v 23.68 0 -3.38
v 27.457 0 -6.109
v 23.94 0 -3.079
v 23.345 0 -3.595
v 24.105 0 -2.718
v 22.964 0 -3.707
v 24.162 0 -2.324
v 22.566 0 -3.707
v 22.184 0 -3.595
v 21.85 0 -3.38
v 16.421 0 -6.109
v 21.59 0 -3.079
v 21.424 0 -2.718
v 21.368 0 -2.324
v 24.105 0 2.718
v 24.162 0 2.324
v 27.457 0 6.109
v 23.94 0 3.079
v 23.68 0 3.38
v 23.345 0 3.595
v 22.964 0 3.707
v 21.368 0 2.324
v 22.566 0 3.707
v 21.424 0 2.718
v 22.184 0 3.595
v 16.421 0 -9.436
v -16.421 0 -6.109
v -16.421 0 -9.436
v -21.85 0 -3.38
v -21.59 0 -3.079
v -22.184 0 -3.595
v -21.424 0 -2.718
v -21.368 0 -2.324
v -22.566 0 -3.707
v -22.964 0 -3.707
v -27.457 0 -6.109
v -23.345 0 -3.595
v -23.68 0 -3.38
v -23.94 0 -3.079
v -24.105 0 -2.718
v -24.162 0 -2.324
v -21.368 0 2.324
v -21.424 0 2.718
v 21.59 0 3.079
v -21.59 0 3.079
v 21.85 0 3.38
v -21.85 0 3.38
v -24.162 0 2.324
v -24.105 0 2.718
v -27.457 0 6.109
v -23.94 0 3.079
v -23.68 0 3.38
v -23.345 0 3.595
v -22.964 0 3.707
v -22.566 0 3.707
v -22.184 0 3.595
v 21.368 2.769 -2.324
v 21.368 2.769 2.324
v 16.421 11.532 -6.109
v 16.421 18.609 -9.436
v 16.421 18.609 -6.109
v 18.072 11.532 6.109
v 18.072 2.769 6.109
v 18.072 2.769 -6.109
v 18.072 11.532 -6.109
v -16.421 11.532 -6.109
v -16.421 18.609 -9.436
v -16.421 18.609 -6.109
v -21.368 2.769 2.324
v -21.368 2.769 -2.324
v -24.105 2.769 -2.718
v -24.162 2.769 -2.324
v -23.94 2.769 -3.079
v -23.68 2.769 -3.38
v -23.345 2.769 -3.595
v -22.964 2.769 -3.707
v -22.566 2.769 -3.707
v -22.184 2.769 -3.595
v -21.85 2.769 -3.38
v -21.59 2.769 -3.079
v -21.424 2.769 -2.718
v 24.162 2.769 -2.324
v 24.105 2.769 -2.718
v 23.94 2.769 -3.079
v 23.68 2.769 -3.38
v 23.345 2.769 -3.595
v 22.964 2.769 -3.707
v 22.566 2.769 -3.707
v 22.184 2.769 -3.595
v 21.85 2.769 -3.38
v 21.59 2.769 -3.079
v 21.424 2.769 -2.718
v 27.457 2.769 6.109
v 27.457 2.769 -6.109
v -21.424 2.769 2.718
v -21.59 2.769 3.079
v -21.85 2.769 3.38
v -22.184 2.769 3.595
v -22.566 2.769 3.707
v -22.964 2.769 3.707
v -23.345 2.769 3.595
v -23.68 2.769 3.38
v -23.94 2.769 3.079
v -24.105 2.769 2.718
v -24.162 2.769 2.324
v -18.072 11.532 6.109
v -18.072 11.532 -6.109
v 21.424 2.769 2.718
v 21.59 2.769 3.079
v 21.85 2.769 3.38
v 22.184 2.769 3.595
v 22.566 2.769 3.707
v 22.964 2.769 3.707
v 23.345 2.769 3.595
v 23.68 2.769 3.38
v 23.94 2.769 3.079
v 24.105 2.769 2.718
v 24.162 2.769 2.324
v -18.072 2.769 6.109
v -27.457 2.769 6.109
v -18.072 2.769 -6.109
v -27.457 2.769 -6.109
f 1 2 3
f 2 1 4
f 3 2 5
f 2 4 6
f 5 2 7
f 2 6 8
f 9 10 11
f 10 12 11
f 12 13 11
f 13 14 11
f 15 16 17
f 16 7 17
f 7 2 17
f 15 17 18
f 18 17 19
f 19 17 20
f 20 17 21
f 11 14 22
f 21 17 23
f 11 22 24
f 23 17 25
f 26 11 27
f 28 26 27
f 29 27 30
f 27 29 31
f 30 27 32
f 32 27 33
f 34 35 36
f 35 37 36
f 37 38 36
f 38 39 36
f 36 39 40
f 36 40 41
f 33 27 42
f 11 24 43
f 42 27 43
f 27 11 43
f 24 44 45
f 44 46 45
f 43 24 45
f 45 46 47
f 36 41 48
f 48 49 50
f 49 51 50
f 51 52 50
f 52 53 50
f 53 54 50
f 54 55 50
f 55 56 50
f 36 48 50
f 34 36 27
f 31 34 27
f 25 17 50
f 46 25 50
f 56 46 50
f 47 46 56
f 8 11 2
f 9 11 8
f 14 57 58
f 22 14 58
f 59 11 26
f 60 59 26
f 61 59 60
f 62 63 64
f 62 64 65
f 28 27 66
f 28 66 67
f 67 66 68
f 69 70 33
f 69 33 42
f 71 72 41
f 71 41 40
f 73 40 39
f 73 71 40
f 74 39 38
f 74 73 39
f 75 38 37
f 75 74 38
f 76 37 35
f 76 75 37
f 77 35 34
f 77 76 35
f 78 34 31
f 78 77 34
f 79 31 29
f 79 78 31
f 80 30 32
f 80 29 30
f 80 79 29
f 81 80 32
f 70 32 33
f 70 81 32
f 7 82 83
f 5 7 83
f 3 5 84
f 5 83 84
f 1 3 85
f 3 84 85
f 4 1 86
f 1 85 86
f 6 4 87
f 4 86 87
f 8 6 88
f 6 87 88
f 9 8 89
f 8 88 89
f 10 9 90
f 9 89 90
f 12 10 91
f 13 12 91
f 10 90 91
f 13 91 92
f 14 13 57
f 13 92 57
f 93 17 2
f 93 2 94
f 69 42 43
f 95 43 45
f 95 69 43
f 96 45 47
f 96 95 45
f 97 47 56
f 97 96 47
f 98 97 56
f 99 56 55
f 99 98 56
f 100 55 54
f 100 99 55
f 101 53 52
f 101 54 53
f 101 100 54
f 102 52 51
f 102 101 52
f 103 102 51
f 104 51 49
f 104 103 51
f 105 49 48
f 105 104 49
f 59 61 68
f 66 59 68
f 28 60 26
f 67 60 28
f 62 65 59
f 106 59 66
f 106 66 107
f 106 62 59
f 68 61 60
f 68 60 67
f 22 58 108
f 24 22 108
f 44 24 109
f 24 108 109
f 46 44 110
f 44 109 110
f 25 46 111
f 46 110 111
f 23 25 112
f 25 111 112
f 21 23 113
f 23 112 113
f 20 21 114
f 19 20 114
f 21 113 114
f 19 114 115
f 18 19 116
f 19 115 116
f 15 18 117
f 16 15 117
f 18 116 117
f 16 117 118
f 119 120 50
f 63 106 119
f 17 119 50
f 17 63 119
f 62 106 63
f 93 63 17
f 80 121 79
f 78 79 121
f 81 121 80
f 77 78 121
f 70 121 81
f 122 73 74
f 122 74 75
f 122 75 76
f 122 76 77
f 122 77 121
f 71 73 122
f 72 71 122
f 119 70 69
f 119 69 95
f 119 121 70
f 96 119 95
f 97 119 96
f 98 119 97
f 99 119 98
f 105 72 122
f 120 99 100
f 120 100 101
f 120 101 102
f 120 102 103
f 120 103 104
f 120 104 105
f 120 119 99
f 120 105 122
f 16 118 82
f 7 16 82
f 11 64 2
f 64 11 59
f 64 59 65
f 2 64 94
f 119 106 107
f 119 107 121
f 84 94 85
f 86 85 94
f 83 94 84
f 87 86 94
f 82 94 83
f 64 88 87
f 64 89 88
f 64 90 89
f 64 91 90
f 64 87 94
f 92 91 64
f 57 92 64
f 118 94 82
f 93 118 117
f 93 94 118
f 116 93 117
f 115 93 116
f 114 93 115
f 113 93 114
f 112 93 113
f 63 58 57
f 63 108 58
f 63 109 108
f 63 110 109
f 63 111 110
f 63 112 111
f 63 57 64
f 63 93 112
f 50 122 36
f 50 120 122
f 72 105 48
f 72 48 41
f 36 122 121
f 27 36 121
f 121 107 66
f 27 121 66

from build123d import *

# Parameters (mm, degrees)
BOSS_EXTRUDE1_DEPTH = 6.1087
CUT_EXTRUDE1_DEPTH  = 30.462097676
SKETCH3_W           = 32.8422
SKETCH3_H           = 18.608676988
BOSS_EXTRUDE2_DEPTH = 3.3274


with BuildPart() as part:
    # Sketch1 → Boss-Extrude1 (new, symmetric)
    with BuildSketch(Plane.XY):
        Polygon((-27.4574, 0), (27.4574, 0), (27.4574, 2.7686), (18.0721, 2.7686), (18.0721, 11.5316), (-18.0721, 11.5316), (-18.0721, 2.7686), (-27.4574, 2.7686), align=None)
    extrude(amount=BOSS_EXTRUDE1_DEPTH, both=True)

    # Sketch2 → Cut-Extrude1 (cut, through all)
    with BuildSketch(Plane(origin=(0, 2.7686, 0), x_dir=(1, 0, 0), z_dir=(0, 1, 0))):
        with BuildLine():
            Line((-21.36775, 2.3241), (-21.36775, -2.3241))
            ThreePointArc((-21.36775, -2.3241), (-22.76475, -3.7211), (-24.16175, -2.3241))
            Line((-24.16175, -2.3241), (-24.16175, 2.3241))
            ThreePointArc((-24.16175, 2.3241), (-22.76475, 3.7211), (-21.36775, 2.3241))
        make_face()
        with BuildLine():
            Line((21.36775, 2.3241), (21.36775, -2.3241))
            ThreePointArc((21.36775, -2.3241), (22.76475, -3.7211), (24.16175, -2.3241))
            Line((24.16175, -2.3241), (24.16175, 2.3241))
            ThreePointArc((24.16175, 2.3241), (22.76475, 3.7211), (21.36775, 2.3241))
        make_face()
    extrude(amount=-CUT_EXTRUDE1_DEPTH, mode=Mode.SUBTRACT)

    # Sketch3 → Boss-Extrude2 (add)
    with BuildSketch(Plane(origin=(0, 0, -6.1087), x_dir=(-1, 0, 0), z_dir=(0, 0, -1))):
        with Locations((0, 9.304338494)):
            Rectangle(SKETCH3_W, SKETCH3_H)
    extrude(amount=BOSS_EXTRUDE2_DEPTH)


solid = part.part
